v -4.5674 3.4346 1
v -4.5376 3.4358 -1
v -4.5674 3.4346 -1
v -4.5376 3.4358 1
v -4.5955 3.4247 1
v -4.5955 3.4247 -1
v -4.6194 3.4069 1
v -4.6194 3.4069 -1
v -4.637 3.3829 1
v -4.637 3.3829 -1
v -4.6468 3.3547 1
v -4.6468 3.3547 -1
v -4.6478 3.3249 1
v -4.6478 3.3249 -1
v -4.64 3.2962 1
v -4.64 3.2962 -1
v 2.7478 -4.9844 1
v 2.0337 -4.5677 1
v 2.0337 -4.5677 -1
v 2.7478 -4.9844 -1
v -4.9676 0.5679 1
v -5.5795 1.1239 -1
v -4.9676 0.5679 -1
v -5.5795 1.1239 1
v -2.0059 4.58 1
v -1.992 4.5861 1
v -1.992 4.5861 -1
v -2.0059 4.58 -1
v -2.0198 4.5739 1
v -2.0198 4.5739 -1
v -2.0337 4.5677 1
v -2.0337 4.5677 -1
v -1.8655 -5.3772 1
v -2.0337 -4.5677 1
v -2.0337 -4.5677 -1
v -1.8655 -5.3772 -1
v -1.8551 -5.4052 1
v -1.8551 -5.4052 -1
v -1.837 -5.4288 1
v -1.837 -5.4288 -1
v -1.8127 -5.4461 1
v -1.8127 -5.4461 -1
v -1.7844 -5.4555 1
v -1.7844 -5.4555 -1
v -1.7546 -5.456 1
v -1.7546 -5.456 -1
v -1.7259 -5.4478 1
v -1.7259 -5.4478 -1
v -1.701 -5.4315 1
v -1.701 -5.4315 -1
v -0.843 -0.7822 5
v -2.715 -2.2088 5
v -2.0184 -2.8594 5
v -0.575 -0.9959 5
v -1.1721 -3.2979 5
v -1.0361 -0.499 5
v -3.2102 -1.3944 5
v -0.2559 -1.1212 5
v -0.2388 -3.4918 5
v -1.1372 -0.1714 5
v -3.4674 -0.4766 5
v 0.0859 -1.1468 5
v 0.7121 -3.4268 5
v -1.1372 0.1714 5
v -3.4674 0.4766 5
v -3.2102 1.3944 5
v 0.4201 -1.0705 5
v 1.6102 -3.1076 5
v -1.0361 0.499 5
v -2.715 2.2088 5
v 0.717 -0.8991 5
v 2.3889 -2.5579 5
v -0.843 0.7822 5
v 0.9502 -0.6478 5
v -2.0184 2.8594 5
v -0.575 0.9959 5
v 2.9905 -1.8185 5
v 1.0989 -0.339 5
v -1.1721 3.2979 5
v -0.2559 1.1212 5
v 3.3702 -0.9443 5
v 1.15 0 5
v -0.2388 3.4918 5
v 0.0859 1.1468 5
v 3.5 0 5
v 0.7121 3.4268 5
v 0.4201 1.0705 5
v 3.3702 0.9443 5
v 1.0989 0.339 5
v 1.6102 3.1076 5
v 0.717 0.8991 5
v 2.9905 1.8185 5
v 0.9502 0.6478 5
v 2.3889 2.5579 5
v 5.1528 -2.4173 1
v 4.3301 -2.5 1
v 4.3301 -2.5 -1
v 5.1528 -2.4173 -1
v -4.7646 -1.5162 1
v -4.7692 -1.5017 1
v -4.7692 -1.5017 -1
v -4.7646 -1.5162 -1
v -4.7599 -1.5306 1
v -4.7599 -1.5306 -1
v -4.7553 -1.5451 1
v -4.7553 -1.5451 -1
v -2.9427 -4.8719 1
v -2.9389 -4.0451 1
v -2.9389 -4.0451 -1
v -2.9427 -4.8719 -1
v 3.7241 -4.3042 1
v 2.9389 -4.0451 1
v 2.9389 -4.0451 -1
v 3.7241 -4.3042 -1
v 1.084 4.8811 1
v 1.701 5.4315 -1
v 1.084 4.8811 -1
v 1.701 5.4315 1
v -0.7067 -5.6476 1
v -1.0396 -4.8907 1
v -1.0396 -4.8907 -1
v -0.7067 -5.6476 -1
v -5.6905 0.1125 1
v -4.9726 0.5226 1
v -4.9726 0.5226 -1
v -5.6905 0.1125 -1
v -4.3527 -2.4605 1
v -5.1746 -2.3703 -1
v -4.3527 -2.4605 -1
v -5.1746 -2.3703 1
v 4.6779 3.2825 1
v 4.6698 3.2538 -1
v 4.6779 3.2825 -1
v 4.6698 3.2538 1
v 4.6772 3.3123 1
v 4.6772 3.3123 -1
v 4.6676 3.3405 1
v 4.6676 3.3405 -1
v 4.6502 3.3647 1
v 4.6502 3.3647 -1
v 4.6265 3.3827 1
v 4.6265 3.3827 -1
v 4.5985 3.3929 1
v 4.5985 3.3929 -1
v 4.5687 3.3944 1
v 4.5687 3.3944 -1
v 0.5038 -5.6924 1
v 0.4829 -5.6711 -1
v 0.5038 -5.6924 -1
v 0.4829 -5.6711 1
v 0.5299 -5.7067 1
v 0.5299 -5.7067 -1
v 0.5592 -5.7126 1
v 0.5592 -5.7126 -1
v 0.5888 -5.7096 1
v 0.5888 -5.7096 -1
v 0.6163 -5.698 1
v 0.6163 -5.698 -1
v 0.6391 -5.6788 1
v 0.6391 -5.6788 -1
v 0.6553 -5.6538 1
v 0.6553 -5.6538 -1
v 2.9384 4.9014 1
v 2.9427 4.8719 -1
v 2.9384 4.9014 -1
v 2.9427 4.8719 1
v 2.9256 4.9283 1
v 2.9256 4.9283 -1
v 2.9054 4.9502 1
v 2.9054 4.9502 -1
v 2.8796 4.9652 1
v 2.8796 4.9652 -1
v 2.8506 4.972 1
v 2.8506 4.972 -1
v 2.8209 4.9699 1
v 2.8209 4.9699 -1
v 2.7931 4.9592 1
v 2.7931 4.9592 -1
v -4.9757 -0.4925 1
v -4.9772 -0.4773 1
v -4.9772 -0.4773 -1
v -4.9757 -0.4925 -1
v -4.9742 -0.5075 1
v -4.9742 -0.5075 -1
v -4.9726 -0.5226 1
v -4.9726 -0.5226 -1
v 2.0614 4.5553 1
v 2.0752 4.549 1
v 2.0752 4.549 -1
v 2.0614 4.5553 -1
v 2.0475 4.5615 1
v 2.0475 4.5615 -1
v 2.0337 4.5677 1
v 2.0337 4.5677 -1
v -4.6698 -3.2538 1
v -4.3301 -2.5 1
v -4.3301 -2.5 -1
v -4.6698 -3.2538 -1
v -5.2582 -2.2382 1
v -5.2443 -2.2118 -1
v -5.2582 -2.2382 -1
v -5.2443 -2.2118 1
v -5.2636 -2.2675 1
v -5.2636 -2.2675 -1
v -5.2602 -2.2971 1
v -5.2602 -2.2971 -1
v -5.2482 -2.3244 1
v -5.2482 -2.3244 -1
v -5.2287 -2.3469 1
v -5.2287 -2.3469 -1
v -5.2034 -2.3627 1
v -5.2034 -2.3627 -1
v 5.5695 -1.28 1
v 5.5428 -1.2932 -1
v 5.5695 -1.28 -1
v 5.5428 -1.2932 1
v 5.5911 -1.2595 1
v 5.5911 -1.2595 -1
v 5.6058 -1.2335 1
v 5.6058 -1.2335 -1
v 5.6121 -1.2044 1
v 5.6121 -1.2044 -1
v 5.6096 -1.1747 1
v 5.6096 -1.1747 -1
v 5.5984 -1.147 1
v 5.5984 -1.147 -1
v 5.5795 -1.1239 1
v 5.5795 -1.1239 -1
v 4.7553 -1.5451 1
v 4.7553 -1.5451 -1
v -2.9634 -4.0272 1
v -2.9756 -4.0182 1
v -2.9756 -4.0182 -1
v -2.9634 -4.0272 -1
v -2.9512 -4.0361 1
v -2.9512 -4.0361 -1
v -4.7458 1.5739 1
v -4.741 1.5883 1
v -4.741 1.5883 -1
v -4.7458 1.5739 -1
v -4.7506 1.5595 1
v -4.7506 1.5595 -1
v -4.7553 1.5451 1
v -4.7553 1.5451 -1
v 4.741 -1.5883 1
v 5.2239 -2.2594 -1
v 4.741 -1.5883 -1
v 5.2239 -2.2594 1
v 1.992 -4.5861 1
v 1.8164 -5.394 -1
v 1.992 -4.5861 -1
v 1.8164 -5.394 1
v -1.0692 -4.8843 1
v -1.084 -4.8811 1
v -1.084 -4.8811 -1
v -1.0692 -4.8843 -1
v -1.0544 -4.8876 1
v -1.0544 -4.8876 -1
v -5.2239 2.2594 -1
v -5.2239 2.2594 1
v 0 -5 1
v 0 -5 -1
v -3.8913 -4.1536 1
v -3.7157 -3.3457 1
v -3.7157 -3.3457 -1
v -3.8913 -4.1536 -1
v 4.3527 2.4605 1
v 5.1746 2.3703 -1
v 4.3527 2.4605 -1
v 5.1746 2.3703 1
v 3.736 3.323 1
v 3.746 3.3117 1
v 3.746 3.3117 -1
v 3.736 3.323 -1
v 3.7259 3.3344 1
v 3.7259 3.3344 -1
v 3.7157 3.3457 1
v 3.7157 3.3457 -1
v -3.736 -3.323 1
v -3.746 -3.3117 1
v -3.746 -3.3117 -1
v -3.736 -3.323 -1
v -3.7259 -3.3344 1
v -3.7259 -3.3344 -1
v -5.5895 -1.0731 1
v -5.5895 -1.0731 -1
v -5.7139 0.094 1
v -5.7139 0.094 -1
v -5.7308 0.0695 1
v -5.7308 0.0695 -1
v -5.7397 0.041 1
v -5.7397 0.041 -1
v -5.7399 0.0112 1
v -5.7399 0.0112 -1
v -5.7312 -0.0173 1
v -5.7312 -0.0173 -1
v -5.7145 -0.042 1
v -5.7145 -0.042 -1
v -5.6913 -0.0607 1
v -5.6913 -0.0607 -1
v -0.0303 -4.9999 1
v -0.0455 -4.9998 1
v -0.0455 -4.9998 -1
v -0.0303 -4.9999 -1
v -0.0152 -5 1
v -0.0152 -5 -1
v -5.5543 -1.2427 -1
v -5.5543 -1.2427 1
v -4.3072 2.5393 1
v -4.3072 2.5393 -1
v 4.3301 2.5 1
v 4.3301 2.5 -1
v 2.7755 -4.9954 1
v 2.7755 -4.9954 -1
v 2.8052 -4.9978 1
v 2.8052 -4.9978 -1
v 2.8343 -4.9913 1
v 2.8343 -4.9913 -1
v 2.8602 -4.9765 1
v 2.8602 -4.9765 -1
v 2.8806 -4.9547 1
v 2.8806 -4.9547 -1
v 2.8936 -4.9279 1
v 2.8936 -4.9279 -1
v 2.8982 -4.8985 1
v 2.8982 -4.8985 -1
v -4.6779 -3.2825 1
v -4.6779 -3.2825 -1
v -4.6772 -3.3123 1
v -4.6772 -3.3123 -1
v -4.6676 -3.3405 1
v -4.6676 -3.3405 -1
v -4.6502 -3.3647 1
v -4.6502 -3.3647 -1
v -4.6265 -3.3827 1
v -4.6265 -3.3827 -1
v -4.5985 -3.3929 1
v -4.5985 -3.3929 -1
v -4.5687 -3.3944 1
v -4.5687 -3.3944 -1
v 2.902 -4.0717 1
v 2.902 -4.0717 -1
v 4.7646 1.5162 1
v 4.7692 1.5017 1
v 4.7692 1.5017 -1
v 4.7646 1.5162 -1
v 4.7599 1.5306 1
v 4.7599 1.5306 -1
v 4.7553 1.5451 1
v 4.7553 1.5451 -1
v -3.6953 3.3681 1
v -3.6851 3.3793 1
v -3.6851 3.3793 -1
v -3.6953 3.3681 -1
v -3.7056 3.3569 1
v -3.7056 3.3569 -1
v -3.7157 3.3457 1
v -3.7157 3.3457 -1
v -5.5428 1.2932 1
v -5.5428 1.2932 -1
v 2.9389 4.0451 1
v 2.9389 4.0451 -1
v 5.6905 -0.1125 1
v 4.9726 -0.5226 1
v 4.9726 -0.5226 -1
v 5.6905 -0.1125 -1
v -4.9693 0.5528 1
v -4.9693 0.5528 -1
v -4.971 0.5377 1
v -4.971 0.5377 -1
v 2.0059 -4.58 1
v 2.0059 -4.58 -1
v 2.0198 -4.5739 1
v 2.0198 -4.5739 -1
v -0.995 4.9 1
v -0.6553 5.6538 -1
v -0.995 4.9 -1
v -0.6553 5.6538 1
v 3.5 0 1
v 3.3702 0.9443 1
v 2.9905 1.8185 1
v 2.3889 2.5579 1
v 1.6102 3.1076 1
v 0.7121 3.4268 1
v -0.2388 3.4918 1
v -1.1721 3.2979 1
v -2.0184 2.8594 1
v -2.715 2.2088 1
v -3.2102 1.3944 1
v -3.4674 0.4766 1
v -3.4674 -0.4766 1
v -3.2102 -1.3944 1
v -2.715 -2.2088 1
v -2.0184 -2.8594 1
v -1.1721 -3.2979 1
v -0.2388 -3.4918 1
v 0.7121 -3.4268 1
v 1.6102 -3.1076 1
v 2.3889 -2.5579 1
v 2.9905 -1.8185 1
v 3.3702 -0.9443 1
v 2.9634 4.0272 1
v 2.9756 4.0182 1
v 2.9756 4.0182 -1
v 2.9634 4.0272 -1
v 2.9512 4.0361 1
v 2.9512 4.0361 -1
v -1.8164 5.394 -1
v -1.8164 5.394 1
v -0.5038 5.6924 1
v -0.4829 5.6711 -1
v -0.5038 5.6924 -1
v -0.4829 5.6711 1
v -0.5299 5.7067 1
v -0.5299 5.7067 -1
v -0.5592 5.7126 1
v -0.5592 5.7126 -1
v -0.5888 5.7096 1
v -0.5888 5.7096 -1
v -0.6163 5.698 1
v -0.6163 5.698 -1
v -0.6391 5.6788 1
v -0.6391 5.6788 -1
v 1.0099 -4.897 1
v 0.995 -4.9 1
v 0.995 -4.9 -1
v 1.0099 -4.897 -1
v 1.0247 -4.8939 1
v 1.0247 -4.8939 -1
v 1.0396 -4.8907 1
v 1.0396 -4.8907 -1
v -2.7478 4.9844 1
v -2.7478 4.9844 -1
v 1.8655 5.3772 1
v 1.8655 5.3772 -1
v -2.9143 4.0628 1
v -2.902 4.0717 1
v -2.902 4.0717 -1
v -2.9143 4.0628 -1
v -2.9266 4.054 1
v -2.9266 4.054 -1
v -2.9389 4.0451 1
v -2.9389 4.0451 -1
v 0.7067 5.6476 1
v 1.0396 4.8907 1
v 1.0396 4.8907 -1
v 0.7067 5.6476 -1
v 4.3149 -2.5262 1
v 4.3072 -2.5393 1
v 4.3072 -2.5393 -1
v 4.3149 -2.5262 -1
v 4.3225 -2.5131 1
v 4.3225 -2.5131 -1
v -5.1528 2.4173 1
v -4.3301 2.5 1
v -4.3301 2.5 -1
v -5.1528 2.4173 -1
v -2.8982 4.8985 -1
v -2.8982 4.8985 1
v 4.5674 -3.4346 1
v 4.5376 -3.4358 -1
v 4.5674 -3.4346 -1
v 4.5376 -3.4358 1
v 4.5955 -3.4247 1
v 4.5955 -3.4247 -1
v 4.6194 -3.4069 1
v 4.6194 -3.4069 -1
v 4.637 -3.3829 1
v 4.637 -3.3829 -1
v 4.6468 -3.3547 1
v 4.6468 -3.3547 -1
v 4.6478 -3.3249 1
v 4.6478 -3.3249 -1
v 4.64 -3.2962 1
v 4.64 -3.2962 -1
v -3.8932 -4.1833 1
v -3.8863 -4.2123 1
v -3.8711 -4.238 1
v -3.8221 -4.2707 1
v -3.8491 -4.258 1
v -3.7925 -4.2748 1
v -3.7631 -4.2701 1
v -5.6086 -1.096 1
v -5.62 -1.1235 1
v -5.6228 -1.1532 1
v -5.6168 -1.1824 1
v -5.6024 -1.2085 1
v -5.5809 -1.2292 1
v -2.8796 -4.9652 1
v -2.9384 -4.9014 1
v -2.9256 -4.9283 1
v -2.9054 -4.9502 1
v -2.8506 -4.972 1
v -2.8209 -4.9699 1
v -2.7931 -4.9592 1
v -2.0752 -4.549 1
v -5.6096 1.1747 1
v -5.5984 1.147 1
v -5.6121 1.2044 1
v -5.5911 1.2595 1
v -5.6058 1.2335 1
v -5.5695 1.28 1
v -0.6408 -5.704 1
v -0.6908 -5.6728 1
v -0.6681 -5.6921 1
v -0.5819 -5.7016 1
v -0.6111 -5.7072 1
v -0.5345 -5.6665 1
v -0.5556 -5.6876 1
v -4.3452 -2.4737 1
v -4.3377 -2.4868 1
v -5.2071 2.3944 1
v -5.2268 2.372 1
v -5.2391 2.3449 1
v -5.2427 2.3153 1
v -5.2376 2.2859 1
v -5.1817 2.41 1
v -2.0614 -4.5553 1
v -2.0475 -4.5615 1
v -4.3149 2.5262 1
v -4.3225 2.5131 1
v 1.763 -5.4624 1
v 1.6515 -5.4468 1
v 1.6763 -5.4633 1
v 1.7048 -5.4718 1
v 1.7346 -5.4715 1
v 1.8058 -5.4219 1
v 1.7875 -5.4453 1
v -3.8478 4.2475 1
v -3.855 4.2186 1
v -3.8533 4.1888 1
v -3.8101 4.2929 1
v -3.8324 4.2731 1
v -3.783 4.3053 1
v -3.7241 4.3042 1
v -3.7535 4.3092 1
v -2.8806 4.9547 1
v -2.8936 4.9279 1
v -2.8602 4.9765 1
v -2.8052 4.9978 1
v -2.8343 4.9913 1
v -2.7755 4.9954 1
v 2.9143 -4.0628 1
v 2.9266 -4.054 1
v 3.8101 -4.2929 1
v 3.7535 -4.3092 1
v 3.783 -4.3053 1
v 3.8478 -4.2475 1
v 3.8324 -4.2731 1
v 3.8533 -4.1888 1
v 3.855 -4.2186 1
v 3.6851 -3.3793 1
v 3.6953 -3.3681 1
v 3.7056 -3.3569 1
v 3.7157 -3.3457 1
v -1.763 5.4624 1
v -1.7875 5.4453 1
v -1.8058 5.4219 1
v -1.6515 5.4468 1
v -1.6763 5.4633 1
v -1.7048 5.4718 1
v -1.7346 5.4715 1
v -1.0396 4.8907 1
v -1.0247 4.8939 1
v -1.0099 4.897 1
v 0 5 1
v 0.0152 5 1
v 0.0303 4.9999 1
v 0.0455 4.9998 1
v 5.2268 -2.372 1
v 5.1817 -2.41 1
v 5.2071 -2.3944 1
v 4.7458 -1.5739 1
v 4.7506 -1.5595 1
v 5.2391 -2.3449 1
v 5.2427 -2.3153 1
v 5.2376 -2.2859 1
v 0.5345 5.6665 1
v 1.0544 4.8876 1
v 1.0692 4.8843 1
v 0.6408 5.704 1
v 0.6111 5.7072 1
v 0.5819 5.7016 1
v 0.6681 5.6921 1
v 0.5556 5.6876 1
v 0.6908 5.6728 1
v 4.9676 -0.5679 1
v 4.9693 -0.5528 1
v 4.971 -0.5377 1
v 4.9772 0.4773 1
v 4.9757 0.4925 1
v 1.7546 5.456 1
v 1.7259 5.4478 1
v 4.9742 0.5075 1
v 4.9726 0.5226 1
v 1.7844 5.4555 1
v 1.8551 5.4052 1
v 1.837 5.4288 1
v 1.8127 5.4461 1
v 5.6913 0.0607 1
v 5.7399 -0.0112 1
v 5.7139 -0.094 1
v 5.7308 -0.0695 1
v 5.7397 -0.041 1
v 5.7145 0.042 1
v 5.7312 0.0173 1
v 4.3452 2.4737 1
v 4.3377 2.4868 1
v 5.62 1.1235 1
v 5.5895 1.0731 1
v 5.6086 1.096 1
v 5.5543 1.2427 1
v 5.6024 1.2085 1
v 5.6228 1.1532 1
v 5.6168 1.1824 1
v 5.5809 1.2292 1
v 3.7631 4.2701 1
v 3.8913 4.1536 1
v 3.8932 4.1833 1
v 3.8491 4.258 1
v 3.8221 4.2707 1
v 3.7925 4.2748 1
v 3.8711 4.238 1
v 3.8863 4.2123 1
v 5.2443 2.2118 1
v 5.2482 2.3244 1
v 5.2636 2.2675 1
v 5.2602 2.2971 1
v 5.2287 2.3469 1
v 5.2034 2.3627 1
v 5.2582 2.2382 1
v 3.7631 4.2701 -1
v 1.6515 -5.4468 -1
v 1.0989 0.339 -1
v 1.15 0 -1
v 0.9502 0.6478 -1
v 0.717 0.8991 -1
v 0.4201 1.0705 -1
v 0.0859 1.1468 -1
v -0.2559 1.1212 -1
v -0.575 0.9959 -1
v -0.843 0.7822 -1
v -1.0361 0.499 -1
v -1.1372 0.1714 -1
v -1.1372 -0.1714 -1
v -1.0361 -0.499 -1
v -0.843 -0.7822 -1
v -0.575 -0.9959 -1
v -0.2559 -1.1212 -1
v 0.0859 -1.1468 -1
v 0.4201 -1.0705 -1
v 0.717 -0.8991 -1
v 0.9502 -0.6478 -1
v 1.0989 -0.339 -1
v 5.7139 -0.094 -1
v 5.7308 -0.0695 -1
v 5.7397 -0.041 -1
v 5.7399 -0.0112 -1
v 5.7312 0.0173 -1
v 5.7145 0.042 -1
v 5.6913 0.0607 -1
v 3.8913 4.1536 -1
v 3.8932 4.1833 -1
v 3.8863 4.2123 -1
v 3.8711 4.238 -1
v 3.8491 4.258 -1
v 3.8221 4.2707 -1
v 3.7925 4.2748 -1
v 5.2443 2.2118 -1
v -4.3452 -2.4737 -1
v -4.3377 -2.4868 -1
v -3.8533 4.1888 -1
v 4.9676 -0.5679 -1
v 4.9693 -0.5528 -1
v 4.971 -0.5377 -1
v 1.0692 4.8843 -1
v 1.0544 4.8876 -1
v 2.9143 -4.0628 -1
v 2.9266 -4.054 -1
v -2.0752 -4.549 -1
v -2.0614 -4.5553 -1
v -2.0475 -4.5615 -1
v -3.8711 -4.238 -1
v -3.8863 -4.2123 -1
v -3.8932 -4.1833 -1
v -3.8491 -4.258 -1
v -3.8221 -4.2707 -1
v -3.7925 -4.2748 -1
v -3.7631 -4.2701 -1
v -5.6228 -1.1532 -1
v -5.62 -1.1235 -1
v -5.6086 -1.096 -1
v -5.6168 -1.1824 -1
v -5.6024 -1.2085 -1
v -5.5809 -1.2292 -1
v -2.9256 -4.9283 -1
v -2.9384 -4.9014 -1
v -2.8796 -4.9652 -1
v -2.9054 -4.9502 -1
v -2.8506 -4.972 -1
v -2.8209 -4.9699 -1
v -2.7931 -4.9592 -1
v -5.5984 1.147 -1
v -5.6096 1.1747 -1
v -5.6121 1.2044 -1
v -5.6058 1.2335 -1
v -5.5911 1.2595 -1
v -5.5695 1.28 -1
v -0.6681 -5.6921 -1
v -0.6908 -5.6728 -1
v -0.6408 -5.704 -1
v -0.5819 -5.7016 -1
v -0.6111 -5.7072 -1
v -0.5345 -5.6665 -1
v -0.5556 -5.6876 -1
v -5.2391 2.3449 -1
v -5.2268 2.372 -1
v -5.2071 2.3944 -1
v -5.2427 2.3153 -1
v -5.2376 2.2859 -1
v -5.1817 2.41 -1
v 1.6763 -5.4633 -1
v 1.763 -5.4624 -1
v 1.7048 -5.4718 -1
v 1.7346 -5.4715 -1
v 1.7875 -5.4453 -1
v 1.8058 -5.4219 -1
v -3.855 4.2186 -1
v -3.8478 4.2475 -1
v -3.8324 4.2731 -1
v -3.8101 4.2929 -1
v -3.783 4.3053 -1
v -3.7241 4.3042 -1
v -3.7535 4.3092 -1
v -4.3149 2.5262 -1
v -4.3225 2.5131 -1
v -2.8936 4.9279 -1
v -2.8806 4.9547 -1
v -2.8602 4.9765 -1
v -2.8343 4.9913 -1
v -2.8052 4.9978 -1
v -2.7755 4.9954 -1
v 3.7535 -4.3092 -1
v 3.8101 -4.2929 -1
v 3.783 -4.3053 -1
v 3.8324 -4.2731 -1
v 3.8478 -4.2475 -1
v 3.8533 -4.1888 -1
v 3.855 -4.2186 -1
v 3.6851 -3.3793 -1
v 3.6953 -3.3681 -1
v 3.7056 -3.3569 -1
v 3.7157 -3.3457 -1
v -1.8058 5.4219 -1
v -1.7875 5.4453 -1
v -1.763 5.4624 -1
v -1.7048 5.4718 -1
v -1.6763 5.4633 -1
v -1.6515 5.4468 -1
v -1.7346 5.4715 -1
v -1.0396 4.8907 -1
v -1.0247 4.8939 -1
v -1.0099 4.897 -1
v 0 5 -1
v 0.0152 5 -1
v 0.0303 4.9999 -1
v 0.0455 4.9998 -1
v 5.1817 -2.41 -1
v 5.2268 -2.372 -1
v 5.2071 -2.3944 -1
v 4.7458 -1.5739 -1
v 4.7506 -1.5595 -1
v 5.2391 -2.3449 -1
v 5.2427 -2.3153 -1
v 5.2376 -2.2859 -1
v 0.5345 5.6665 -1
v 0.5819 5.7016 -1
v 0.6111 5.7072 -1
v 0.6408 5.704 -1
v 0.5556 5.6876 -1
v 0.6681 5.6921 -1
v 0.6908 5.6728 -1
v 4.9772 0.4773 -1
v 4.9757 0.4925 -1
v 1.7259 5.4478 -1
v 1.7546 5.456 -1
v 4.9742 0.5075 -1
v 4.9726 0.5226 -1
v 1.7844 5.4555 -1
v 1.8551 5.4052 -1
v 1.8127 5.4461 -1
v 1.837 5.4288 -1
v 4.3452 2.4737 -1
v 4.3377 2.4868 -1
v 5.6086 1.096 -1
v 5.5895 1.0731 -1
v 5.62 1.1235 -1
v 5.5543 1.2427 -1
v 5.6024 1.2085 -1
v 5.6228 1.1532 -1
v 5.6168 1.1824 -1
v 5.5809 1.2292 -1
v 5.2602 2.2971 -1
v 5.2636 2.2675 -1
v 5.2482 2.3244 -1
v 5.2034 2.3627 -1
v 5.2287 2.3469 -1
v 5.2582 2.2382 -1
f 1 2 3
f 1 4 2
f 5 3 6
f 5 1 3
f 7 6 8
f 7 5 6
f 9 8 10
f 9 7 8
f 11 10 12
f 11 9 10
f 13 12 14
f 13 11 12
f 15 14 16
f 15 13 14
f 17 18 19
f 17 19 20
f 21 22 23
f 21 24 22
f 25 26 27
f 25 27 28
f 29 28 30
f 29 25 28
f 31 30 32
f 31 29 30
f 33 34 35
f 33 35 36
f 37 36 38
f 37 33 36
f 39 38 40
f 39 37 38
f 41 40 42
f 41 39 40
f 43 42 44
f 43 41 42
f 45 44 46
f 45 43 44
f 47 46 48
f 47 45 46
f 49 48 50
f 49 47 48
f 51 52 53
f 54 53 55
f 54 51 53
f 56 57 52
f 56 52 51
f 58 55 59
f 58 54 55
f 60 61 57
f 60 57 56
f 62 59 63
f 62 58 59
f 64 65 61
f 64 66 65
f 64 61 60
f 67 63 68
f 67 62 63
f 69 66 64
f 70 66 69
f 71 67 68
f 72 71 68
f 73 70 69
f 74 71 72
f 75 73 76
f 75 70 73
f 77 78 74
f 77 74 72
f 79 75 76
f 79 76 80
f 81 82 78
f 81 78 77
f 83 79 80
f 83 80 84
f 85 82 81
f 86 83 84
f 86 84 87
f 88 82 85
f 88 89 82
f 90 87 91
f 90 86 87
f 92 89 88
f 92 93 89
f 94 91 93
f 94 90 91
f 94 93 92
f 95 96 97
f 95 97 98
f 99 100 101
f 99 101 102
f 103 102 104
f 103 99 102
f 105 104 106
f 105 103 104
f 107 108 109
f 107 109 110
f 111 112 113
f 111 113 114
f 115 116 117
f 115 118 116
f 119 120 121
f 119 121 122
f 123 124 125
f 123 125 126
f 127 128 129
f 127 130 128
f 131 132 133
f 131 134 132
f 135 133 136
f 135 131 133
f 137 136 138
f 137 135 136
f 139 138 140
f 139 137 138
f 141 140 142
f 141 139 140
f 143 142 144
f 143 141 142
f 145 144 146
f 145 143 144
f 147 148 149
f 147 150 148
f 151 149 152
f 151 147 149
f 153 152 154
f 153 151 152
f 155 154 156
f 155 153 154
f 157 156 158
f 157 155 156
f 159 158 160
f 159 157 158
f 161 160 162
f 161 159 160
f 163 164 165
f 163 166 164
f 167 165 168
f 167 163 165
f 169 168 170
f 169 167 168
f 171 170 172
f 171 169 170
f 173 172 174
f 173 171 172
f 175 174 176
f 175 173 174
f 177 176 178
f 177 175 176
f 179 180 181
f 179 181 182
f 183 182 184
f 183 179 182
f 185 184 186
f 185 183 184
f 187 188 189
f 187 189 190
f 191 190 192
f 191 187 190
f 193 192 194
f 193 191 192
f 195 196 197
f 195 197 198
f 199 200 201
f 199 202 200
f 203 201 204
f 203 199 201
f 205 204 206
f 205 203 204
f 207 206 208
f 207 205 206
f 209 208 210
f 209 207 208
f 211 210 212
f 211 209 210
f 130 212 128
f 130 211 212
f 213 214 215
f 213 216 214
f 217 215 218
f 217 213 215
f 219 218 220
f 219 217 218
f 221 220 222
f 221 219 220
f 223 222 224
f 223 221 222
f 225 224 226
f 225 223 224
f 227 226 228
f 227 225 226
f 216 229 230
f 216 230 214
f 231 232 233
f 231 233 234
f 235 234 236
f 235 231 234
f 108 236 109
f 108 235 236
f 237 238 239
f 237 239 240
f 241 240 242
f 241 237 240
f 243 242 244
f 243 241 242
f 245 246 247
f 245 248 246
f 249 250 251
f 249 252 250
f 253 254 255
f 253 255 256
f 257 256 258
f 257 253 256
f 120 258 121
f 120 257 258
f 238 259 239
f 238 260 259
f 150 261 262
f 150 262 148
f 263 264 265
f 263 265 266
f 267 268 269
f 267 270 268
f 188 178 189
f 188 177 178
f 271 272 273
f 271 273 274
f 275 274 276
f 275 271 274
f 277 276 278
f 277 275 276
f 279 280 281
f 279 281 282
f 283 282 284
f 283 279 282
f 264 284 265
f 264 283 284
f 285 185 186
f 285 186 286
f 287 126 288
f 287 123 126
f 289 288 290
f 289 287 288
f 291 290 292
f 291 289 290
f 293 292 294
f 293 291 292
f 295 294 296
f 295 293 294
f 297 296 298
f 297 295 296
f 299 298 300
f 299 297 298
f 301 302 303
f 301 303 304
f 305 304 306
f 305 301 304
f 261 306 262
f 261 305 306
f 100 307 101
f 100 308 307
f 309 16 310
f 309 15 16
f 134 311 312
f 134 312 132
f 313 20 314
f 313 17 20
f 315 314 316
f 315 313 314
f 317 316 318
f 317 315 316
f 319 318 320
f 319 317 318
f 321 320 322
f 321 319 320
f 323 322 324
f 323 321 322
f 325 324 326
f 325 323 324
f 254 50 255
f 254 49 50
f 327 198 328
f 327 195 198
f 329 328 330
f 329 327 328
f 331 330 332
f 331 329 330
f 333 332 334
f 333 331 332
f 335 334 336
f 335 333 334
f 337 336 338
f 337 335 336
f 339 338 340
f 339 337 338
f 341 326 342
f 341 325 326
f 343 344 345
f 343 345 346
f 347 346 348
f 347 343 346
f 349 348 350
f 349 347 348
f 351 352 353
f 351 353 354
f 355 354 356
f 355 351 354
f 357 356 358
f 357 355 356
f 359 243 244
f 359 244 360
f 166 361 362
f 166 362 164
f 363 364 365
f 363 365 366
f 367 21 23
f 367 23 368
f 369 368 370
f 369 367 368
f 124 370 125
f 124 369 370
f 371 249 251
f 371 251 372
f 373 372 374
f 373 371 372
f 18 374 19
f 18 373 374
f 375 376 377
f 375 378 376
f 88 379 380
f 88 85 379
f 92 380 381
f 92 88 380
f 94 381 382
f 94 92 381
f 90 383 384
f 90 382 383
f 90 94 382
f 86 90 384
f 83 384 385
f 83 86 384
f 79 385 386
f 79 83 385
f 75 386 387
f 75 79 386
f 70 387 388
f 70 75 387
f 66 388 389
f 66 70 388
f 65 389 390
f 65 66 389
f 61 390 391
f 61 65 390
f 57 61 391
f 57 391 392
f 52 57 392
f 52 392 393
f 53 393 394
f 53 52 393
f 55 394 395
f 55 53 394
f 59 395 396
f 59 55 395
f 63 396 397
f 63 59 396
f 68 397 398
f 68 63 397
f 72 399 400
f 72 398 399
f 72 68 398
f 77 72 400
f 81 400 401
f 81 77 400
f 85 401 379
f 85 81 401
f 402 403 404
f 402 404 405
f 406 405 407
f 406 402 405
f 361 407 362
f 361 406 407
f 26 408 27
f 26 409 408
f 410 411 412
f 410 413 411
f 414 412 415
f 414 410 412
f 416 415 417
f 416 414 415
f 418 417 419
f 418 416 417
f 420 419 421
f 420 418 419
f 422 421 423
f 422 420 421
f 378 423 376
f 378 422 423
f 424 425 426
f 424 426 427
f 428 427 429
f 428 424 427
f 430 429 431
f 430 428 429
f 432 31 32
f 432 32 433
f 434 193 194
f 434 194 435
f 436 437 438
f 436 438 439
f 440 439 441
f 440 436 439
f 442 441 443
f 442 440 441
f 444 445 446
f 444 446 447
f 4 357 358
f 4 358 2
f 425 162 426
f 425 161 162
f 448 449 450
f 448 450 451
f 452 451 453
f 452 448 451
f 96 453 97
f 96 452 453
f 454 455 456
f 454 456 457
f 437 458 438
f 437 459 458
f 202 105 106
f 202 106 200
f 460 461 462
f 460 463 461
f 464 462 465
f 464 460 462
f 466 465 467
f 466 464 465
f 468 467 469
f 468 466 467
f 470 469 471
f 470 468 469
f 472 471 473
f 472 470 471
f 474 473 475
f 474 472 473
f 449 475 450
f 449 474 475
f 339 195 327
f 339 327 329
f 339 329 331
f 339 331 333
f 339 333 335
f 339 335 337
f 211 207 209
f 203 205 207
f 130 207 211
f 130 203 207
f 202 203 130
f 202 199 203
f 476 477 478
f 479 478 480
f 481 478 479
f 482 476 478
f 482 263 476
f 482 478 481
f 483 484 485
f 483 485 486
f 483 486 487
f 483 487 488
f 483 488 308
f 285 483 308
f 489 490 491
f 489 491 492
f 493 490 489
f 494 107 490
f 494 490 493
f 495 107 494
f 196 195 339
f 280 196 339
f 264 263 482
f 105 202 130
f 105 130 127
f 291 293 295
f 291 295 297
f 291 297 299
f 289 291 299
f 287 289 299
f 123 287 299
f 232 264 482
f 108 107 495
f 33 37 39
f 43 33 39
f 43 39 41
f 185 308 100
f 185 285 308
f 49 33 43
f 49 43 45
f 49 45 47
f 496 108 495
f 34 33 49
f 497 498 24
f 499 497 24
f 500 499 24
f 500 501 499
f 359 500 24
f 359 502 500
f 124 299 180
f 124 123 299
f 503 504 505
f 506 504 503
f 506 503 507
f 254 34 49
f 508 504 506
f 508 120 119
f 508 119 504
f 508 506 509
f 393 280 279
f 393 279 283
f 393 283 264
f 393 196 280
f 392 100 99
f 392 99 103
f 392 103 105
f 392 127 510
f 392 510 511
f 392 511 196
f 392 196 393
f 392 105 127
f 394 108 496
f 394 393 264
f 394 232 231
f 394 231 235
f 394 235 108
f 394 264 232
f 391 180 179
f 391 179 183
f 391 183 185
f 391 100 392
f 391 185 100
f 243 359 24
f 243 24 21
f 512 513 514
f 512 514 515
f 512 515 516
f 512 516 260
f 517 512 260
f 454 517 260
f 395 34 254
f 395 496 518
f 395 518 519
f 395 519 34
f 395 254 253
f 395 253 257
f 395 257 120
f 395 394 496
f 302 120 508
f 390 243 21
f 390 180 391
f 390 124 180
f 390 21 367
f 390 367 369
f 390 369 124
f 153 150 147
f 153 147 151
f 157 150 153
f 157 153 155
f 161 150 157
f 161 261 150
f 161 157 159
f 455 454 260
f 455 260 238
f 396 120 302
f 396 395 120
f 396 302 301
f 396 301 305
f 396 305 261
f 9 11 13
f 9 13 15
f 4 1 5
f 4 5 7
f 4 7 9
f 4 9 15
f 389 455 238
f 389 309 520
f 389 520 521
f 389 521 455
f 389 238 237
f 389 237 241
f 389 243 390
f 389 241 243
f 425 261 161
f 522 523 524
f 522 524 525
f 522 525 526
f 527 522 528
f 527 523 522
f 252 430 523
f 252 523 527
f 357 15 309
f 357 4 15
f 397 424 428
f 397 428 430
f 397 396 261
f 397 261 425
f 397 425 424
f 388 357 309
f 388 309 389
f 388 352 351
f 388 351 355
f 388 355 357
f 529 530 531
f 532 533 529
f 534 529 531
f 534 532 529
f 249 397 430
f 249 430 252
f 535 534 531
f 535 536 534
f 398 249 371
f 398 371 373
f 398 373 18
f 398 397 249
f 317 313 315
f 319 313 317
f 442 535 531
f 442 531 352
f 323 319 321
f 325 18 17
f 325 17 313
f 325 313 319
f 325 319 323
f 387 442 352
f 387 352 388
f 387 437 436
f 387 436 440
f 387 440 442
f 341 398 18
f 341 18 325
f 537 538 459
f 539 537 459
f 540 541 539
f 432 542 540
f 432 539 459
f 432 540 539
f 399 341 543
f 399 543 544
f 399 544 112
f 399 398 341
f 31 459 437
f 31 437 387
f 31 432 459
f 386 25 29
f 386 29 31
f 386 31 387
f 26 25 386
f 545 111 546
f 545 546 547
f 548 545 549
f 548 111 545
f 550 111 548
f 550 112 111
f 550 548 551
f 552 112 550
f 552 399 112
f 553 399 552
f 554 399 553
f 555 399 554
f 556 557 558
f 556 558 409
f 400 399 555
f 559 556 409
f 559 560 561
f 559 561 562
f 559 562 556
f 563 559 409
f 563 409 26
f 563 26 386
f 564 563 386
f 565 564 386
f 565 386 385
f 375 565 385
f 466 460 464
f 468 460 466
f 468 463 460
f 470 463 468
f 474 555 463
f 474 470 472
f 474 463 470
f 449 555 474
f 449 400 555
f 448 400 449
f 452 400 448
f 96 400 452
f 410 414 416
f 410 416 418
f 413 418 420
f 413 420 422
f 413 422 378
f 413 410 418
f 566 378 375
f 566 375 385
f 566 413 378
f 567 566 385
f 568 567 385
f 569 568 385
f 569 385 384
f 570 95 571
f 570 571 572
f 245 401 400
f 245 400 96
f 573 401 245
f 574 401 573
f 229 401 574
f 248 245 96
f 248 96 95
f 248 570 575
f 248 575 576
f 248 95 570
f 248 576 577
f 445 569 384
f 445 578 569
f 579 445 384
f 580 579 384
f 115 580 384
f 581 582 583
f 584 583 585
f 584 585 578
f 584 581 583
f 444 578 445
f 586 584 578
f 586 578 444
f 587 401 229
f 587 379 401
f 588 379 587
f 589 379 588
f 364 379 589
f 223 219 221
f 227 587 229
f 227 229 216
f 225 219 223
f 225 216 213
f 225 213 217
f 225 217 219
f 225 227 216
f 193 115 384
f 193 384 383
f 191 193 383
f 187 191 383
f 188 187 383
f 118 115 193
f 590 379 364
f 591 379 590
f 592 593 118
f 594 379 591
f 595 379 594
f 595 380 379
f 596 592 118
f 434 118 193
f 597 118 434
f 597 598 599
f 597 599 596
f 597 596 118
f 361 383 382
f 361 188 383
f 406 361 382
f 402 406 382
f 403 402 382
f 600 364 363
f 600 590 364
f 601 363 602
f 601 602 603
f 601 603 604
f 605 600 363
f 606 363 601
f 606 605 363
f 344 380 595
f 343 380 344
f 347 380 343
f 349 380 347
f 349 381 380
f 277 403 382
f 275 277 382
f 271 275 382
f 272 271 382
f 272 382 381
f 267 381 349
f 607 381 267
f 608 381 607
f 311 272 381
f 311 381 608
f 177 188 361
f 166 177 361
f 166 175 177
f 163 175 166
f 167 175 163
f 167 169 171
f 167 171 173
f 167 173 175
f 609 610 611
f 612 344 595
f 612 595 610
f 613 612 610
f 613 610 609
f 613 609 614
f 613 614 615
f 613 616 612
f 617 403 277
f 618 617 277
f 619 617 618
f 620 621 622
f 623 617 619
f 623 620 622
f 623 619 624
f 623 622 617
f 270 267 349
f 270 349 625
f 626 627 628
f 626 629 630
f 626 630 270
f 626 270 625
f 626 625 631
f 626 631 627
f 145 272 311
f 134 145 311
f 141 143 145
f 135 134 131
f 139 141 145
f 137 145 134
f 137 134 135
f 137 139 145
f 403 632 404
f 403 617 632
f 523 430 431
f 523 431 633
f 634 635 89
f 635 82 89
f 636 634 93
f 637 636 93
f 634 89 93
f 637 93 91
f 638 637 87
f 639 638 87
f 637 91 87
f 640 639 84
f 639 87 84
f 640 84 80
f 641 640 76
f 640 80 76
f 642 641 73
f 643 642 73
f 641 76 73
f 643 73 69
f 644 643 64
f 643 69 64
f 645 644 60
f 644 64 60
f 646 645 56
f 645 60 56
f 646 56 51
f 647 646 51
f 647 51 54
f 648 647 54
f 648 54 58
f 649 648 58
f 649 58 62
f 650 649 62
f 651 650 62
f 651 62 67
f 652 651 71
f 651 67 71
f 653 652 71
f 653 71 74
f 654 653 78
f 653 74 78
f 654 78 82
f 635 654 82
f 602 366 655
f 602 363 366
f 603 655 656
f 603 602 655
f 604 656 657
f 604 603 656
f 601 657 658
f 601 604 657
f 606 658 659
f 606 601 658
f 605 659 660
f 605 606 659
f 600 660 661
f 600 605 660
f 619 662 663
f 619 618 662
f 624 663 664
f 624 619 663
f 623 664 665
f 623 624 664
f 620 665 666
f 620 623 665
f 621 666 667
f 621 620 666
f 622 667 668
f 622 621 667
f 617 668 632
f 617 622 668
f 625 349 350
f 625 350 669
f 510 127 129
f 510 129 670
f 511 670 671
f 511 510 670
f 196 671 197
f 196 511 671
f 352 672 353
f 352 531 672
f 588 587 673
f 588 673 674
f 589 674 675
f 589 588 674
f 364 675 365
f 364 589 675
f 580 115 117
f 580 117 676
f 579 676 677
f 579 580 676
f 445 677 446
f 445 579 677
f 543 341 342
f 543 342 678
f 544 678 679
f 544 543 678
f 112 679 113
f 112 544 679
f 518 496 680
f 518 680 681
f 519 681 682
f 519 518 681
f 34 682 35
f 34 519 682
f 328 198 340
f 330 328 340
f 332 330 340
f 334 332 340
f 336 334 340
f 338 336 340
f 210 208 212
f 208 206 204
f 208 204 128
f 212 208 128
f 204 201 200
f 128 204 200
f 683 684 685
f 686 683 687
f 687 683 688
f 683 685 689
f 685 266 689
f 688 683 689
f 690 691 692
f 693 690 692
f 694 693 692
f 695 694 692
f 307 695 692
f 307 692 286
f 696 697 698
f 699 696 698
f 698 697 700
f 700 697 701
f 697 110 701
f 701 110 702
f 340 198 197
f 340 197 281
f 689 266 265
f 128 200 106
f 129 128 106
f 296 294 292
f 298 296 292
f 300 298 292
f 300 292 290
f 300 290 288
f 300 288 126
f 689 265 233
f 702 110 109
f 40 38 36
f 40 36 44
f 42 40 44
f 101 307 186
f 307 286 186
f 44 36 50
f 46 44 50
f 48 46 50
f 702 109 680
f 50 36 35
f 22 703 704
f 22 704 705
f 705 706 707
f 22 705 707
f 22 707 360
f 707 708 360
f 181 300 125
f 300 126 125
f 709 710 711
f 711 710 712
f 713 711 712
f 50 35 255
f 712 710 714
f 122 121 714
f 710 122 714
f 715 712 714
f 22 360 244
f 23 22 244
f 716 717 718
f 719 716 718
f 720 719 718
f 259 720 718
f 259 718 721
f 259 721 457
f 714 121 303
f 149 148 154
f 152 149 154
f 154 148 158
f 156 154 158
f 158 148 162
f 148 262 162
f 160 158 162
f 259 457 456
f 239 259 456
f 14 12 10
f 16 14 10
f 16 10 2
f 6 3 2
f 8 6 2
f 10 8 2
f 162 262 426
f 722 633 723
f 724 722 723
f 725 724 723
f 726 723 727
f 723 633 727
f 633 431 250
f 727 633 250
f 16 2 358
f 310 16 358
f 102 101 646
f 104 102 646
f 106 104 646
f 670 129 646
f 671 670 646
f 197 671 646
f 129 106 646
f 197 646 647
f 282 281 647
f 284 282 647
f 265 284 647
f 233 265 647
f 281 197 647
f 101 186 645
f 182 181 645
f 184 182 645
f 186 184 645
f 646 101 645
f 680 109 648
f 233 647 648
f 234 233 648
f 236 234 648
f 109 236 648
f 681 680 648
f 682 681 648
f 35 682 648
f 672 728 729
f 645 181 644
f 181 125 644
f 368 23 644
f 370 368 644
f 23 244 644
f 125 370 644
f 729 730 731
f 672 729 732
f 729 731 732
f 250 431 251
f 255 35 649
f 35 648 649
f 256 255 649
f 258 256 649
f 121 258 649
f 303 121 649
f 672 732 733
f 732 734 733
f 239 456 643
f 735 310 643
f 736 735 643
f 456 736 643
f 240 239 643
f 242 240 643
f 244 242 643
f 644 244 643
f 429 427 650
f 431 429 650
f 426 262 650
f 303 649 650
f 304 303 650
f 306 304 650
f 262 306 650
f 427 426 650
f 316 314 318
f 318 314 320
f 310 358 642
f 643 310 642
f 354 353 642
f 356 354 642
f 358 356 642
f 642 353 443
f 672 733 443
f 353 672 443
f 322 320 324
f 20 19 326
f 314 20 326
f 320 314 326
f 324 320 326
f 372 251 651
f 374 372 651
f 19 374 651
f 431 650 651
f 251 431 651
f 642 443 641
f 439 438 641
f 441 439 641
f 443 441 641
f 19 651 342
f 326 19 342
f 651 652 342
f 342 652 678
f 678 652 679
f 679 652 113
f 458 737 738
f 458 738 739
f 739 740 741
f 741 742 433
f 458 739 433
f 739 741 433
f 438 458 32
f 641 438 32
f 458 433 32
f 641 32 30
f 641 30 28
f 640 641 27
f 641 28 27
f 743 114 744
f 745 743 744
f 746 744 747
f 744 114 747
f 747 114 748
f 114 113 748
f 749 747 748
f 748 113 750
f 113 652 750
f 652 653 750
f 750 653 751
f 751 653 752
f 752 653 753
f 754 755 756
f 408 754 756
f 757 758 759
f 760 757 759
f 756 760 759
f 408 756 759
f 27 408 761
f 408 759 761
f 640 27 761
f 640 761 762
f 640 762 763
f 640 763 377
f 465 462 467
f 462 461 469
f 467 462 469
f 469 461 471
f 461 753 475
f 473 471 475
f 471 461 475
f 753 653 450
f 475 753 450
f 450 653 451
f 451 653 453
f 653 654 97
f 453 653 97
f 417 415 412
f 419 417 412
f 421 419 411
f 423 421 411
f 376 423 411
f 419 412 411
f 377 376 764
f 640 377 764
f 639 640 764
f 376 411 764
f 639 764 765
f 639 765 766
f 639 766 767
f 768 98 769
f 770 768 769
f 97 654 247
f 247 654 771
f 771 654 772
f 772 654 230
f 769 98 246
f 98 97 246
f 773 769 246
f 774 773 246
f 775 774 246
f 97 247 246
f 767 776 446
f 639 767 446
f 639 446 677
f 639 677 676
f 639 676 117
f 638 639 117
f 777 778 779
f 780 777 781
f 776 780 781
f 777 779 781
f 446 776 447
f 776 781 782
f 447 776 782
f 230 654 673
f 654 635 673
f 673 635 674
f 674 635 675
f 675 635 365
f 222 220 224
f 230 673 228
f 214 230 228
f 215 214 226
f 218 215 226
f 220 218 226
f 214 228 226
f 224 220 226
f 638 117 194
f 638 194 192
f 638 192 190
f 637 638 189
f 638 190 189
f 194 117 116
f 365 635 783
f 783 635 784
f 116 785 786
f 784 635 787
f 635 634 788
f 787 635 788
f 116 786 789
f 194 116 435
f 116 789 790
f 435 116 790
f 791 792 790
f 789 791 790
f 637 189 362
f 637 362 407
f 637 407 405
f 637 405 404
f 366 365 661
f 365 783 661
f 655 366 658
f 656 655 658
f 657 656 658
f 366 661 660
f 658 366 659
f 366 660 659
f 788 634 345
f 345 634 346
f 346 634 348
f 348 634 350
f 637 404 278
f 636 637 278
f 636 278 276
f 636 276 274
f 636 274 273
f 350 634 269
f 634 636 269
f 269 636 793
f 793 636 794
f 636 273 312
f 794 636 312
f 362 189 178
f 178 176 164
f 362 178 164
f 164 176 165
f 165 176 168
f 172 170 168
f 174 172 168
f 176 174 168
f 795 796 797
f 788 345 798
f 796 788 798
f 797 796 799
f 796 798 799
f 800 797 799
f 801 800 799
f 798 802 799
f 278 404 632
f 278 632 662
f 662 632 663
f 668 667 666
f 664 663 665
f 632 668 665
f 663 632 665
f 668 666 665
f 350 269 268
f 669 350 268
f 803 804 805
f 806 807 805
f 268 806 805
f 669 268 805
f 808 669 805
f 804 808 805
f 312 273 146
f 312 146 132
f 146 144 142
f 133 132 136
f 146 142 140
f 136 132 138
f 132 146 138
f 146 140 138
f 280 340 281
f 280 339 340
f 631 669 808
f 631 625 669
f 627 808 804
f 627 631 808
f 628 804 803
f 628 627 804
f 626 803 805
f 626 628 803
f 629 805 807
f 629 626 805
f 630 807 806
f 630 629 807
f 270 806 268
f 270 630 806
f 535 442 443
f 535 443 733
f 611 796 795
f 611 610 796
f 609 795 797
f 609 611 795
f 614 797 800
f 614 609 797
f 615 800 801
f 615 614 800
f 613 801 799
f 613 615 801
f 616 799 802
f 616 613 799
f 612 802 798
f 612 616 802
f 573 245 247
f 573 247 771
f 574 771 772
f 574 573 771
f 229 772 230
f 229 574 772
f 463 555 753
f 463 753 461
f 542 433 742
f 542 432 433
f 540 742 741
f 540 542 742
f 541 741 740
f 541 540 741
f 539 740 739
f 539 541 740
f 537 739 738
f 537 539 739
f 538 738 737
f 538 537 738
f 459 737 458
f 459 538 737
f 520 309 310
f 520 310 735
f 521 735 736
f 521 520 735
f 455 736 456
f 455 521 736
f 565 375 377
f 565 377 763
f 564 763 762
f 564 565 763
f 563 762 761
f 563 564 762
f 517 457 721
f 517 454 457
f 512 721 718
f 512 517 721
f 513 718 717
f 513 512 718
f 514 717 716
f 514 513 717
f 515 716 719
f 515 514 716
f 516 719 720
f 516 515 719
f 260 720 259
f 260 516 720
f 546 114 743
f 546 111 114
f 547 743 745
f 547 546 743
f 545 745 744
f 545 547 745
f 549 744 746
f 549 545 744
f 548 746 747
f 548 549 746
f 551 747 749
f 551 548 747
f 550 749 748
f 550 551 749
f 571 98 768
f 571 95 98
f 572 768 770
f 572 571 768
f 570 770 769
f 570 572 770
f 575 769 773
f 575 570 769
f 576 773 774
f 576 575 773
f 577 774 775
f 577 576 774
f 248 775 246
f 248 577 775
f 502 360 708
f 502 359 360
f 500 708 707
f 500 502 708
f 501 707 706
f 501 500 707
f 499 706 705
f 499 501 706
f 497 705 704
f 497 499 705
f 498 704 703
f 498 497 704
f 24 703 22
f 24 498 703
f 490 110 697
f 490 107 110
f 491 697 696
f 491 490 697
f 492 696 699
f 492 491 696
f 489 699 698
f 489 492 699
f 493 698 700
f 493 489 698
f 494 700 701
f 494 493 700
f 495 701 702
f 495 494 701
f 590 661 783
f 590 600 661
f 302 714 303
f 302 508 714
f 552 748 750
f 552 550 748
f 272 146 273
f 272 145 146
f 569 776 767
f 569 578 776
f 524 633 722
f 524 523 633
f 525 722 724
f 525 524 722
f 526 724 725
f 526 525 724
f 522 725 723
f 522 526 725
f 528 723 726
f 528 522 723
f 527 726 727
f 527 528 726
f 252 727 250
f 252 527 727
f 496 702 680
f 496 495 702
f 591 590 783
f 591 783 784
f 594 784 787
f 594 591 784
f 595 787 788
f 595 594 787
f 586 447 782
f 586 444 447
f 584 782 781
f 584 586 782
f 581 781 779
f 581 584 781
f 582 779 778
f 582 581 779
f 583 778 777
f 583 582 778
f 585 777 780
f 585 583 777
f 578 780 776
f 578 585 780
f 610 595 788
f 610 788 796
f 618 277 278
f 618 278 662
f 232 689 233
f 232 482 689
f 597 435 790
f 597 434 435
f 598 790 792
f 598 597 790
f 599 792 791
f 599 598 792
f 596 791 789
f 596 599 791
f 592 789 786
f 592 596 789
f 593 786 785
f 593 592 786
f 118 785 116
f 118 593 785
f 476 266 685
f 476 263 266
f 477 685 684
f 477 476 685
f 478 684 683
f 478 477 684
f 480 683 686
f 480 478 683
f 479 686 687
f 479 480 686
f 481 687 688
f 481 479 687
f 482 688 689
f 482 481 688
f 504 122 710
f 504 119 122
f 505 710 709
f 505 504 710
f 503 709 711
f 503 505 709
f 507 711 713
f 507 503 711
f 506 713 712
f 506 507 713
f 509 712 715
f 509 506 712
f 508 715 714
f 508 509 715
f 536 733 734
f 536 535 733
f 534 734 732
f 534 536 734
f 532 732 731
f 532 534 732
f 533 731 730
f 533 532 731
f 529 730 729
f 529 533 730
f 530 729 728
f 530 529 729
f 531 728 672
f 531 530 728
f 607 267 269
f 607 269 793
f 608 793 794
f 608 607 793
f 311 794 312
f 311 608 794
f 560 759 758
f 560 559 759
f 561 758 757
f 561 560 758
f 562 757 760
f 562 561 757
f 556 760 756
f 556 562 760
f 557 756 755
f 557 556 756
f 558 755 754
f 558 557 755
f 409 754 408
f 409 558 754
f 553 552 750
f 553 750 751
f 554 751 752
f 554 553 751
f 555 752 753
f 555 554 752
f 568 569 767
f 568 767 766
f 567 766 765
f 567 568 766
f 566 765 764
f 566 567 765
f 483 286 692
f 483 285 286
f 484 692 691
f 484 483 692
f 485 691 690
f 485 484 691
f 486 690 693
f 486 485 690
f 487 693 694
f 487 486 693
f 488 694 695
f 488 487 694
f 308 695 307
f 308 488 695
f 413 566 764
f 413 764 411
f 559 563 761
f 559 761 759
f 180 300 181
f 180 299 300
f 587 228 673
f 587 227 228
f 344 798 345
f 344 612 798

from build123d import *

# Parameters (mm, degrees)
F0_R     = 3.5
F0_R_2   = 1.15
F2_DEPTH = 5
F3_DEPTH = 1
F4_DEPTH = 1
F5_DEPTH = 1
F6_COUNT = 30


with BuildPart() as f2:
    # F0 (on Top) → F2 (new body)
    with BuildSketch(Plane.XY):
        Circle(F0_R)
        Circle(F0_R_2, mode=Mode.SUBTRACT)
    extrude(amount=F2_DEPTH)

    # F0 (on Top) → F3 (join)
    with BuildSketch(Plane.XY):
        Circle(F0_R)
        Circle(F0_R_2, mode=Mode.SUBTRACT)
    extrude(amount=-F3_DEPTH)

    # F0 (on Top) → F4 (join, symmetric)
    with BuildSketch(Plane.XY):
        with BuildLine():
            Line((0, 5), (-0.9949874371, 4.9))
            ThreePointArc((-0.9949874371, 4.9), (0.5, -4.9749371855), (0, 5))
        make_face()
        Circle(F0_R, mode=Mode.SUBTRACT)
    extrude(amount=F4_DEPTH, both=True)

    # F0 (on Top) → F5 (join, symmetric)
    with BuildSketch(Plane.XY):
        with BuildLine():
            Line((-0.6552646986, 5.6537760274), (-0.9949874371, 4.9))
            Line((-0.9949874371, 4.9), (0, 5))
            Line((0, 5), (-0.4829278192, 5.6710965355))
            ThreePointArc((-0.4829278192, 5.6710965355), (-0.5740962589, 5.7121856533), (-0.6552646986, 5.6537760274))
        make_face()
    extrude(amount=F5_DEPTH, both=True)

    # F6: F2 ×30 about axis
    f6_axis = Axis((0, 0, 13.3862942457), (0, 0, 1))


with BuildPart() as f2_1:
    add(f2.part)
    for i in range(1, F6_COUNT):
        add(f2.part.rotate(f6_axis, i * 360 / F6_COUNT))


solid = f2_1.part
